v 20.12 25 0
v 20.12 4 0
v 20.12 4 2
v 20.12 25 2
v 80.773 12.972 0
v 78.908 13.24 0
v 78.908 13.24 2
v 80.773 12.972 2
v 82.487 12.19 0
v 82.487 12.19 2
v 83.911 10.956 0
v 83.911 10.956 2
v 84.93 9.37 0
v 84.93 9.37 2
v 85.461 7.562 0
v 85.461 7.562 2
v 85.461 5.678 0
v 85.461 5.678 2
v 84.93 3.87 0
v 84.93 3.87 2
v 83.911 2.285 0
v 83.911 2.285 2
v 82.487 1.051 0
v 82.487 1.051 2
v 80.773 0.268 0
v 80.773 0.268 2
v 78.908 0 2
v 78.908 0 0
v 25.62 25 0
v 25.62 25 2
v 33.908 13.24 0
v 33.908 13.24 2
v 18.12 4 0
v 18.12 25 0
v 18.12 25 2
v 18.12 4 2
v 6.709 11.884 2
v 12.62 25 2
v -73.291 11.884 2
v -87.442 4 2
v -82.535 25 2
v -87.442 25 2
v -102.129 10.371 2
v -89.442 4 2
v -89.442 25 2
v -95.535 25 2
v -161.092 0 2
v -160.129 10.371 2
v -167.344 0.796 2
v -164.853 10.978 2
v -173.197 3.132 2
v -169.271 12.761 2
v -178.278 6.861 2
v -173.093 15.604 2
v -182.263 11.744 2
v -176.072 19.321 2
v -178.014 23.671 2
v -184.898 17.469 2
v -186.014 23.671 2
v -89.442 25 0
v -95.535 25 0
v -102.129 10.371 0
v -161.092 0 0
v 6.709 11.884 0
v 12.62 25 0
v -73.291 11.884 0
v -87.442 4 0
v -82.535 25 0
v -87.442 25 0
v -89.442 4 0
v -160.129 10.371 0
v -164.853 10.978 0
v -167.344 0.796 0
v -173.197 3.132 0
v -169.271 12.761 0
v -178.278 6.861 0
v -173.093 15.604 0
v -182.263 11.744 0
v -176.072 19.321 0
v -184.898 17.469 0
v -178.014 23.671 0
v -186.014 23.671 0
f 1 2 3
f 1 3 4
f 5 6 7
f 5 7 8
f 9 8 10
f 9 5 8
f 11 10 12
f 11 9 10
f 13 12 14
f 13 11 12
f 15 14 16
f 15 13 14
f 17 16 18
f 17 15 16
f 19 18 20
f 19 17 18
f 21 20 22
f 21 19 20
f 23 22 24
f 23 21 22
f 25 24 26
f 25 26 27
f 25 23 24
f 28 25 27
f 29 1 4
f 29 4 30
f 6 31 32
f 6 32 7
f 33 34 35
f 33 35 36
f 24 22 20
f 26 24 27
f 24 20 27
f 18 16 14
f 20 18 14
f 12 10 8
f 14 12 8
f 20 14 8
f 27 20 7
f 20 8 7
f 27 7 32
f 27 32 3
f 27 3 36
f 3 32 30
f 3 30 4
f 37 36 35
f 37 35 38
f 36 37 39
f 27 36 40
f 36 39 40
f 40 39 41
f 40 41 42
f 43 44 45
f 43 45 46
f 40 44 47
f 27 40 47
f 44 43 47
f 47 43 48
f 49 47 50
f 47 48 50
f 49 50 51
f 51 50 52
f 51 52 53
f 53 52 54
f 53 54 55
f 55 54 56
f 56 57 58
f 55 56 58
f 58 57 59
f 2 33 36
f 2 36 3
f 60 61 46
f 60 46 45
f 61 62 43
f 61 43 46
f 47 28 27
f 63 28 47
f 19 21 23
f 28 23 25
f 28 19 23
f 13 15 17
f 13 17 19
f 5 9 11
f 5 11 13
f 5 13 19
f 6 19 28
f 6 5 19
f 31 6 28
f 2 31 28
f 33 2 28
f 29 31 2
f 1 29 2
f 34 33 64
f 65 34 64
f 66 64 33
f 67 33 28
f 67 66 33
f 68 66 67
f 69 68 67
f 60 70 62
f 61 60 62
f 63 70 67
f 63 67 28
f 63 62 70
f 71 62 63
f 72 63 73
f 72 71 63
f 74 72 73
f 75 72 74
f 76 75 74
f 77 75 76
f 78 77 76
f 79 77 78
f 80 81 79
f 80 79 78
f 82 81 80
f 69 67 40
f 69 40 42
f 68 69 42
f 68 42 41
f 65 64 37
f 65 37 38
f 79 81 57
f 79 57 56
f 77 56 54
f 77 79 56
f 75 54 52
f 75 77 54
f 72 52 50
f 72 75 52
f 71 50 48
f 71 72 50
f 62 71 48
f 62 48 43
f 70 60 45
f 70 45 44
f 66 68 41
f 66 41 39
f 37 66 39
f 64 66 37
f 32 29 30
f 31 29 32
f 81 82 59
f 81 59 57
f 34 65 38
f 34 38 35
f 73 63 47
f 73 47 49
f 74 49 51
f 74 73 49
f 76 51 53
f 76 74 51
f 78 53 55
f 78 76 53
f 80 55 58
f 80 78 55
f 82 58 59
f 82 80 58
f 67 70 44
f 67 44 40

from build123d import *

# Parameters (mm, degrees)
RESSALTO_EXTRUS_O1_DEPTH = 2


with BuildPart() as part:
    # Esboço1 → Ressalto-extrusão1 (new body)
    with BuildSketch(Plane.XY):
        with BuildLine():
            Line((78.907701248, 0), (-161.092298752, 0))
            ThreePointArc((-161.092298752, 0), (-178.278212695, 6.861020331), (-186.013965864, 23.671355275))
            Line((-186.013965864, 23.671355275), (-178.013965864, 23.671355275))
            ThreePointArc((-178.013965864, 23.671355275), (-171.273030794, 14.060352601), (-160.128605048, 10.370724866))
            Line((-160.128605048, 10.370724866), (-102.128605048, 10.370724866))
            Line((-102.128605048, 10.370724866), (-95.535452379, 25))
            Line((-95.535452379, 25), (-89.442008497, 25))
            Line((-89.442008497, 25), (-89.442008497, 4))
            Line((-89.442008497, 4), (-87.442008497, 4))
            Line((-87.442008497, 4), (-87.442008497, 25))
            Line((-87.442008497, 25), (-82.535452379, 25))
            Line((-82.535452379, 25), (-73.291416334, 11.883859156))
            Line((-73.291416334, 11.883859156), (6.708583666, 11.883859156))
            Line((6.708583666, 11.883859156), (12.619793773, 25))
            Line((12.619793773, 25), (18.119793773, 25))
            Line((18.119793773, 25), (18.119793773, 4))
            Line((18.119793773, 4), (20.119793773, 4))
            Line((20.119793773, 4), (20.119793773, 25))
            Line((20.119793773, 25), (25.619793773, 25))
            Line((25.619793773, 25), (33.907701248, 13.240487032))
            Line((33.907701248, 13.240487032), (78.907701248, 13.240487032))
            ThreePointArc((78.907701248, 13.240487032), (85.527944764, 6.620243516), (78.907701248, 0))
        make_face()
    extrude(amount=RESSALTO_EXTRUS_O1_DEPTH)


solid = part.part
